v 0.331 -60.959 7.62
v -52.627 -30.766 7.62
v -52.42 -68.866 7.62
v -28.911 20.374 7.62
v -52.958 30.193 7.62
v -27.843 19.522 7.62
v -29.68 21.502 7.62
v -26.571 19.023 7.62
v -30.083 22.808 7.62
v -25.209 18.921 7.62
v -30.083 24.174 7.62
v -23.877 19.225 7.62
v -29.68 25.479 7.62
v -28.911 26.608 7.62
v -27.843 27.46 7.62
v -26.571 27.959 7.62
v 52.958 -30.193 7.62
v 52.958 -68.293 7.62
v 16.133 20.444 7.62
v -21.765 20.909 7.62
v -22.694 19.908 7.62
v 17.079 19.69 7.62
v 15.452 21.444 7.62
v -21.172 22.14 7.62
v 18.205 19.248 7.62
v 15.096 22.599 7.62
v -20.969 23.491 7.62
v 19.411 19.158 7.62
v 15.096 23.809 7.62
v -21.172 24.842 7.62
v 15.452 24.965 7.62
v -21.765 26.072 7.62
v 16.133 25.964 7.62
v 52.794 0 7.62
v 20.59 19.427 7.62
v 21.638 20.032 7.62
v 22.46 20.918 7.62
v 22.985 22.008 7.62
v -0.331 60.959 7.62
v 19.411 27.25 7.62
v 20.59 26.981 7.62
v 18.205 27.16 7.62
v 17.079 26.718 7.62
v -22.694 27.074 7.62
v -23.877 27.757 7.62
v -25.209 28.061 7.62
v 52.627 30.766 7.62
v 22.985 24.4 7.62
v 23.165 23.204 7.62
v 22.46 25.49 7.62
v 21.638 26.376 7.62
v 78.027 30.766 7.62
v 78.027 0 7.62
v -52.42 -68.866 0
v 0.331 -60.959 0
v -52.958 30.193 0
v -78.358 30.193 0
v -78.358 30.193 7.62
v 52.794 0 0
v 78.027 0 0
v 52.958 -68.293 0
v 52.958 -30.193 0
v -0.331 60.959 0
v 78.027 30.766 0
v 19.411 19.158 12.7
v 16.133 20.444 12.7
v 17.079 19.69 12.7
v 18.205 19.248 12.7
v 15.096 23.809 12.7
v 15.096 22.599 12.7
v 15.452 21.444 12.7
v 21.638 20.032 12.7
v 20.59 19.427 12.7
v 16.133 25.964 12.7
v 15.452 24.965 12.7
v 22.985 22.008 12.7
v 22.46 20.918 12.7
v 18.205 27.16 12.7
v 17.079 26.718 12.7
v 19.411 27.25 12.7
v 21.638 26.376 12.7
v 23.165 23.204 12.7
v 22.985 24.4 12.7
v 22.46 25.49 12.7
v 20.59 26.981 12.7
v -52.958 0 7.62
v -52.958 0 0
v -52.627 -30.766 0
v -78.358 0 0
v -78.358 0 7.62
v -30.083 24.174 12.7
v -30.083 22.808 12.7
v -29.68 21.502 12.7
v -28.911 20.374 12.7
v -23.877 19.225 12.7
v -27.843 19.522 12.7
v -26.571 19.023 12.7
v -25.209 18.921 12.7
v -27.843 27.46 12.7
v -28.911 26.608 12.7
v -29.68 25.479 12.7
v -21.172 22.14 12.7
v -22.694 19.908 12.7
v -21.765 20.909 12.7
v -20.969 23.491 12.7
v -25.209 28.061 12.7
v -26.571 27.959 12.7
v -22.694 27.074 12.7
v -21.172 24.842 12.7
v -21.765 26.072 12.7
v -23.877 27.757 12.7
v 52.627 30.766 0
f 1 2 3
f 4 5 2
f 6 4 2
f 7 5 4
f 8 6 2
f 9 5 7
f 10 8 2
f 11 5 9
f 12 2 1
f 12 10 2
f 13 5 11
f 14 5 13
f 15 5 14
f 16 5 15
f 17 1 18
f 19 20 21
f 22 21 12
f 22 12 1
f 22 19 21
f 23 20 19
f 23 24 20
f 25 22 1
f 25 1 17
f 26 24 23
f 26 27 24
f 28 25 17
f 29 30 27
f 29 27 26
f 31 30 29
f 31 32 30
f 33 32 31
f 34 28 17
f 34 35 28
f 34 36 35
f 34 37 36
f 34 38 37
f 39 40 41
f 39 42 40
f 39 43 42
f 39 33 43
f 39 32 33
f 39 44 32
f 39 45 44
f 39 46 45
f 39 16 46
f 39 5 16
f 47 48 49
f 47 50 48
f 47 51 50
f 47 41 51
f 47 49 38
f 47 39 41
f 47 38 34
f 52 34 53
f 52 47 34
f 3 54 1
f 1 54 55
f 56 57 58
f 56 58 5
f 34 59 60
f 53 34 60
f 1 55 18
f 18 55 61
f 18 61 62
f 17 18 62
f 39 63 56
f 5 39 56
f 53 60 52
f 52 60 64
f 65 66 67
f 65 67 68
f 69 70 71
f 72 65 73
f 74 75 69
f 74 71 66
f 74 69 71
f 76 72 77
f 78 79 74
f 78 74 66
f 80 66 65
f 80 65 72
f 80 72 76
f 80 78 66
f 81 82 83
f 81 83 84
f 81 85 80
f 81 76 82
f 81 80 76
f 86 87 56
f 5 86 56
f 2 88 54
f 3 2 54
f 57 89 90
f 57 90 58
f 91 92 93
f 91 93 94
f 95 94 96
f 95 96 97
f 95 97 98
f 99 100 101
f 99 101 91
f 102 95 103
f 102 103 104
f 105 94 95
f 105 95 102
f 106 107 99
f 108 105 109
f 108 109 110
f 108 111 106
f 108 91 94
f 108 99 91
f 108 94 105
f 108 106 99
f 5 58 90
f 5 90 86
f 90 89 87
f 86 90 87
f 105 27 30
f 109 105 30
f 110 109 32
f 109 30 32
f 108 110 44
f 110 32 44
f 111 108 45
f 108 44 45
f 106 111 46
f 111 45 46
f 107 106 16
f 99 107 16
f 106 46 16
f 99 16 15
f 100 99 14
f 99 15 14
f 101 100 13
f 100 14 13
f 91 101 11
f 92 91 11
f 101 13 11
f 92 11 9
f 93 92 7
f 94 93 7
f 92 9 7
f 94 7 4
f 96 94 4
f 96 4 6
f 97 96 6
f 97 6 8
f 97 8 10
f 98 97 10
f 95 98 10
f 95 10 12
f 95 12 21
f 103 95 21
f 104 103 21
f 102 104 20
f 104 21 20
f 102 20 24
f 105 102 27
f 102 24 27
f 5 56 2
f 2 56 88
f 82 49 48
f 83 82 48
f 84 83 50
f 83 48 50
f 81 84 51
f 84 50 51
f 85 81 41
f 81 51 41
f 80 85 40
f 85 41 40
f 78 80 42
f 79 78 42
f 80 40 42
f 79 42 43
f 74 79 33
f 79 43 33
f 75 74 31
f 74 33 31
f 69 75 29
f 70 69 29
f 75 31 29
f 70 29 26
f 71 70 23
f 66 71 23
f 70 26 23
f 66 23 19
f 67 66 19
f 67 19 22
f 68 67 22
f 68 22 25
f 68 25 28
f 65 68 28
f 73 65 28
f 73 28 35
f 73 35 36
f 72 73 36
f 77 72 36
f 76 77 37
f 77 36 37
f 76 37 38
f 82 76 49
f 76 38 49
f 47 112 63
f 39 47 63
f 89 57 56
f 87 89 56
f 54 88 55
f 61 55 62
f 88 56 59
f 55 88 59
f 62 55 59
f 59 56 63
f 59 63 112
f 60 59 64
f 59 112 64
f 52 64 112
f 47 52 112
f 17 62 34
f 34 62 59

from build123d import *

# Parameters (mm, degrees)
F1_DEPTH = 7.62
F0_W     = 25.4
F0_H     = 30.1927982898
F4_R     = 4.0575582534
F5_DEPTH = 5.08
F6_R     = 4.5826589952
F7_DEPTH = 5.08


# Not quite as in the source:
# - the program builds the solid bodies; features that only make, move or delete a surface that nothing else refers to are left out


with BuildPart() as f1:
    # F0 (on Top) → F1 (new body)
    with BuildSketch(Plane.XY):
        Polygon((52.9576862357, -30.1927982898), (0.3311127876, -60.9591007506), (52.9576862357, -68.2927982898), align=None)
        Polygon((78.0265734481, 30.7663024608), (52.6265734481, 30.7663024608), (52.793687399, 0), (78.0265734481, 0), align=None)
        Polygon((0.3311127876, -60.9591007506), (-52.6265734481, -30.7663024608), (-52.4196279559, -68.86574043), align=None)
        Polygon((-0.3311127876, 60.9591007506), (-52.9576862357, 30.1927982898), (-52.6265734481, -30.7663024608), (0.3311127876, -60.9591007506), (52.9576862357, -30.1927982898), (52.793687399, 0), (52.6265734481, 0), (52.6265734481, 30.7663024608), align=None)
        Polygon((52.793687399, 0), (52.6265734481, 30.7663024608), (52.6265734481, 0), align=None)
    extrude(amount=F1_DEPTH)

    # F4 (on face) → F5 (join)
    with BuildSketch(Plane.XY.offset(7.62)):
        with Locations((19.1078484058, 23.2041683048)):
            Circle(F4_R)
    extrude(amount=F5_DEPTH)

    # F6 (on face) → F7 (join)
    with BuildSketch(Plane.XY.offset(7.62)):
        with Locations((-25.5514662713, 23.4908163548)):
            Circle(F6_R)
    extrude(amount=F7_DEPTH)


with BuildPart() as f1b:
    # F0 (on Top) → F1, piece 2 (new body)
    with BuildSketch(Plane.XY):
        with Locations((-65.6576862357, 15.0963991449)):
            Rectangle(F0_W, F0_H)
    extrude(amount=F1_DEPTH)


solid = Compound([f1.part, f1b.part])
